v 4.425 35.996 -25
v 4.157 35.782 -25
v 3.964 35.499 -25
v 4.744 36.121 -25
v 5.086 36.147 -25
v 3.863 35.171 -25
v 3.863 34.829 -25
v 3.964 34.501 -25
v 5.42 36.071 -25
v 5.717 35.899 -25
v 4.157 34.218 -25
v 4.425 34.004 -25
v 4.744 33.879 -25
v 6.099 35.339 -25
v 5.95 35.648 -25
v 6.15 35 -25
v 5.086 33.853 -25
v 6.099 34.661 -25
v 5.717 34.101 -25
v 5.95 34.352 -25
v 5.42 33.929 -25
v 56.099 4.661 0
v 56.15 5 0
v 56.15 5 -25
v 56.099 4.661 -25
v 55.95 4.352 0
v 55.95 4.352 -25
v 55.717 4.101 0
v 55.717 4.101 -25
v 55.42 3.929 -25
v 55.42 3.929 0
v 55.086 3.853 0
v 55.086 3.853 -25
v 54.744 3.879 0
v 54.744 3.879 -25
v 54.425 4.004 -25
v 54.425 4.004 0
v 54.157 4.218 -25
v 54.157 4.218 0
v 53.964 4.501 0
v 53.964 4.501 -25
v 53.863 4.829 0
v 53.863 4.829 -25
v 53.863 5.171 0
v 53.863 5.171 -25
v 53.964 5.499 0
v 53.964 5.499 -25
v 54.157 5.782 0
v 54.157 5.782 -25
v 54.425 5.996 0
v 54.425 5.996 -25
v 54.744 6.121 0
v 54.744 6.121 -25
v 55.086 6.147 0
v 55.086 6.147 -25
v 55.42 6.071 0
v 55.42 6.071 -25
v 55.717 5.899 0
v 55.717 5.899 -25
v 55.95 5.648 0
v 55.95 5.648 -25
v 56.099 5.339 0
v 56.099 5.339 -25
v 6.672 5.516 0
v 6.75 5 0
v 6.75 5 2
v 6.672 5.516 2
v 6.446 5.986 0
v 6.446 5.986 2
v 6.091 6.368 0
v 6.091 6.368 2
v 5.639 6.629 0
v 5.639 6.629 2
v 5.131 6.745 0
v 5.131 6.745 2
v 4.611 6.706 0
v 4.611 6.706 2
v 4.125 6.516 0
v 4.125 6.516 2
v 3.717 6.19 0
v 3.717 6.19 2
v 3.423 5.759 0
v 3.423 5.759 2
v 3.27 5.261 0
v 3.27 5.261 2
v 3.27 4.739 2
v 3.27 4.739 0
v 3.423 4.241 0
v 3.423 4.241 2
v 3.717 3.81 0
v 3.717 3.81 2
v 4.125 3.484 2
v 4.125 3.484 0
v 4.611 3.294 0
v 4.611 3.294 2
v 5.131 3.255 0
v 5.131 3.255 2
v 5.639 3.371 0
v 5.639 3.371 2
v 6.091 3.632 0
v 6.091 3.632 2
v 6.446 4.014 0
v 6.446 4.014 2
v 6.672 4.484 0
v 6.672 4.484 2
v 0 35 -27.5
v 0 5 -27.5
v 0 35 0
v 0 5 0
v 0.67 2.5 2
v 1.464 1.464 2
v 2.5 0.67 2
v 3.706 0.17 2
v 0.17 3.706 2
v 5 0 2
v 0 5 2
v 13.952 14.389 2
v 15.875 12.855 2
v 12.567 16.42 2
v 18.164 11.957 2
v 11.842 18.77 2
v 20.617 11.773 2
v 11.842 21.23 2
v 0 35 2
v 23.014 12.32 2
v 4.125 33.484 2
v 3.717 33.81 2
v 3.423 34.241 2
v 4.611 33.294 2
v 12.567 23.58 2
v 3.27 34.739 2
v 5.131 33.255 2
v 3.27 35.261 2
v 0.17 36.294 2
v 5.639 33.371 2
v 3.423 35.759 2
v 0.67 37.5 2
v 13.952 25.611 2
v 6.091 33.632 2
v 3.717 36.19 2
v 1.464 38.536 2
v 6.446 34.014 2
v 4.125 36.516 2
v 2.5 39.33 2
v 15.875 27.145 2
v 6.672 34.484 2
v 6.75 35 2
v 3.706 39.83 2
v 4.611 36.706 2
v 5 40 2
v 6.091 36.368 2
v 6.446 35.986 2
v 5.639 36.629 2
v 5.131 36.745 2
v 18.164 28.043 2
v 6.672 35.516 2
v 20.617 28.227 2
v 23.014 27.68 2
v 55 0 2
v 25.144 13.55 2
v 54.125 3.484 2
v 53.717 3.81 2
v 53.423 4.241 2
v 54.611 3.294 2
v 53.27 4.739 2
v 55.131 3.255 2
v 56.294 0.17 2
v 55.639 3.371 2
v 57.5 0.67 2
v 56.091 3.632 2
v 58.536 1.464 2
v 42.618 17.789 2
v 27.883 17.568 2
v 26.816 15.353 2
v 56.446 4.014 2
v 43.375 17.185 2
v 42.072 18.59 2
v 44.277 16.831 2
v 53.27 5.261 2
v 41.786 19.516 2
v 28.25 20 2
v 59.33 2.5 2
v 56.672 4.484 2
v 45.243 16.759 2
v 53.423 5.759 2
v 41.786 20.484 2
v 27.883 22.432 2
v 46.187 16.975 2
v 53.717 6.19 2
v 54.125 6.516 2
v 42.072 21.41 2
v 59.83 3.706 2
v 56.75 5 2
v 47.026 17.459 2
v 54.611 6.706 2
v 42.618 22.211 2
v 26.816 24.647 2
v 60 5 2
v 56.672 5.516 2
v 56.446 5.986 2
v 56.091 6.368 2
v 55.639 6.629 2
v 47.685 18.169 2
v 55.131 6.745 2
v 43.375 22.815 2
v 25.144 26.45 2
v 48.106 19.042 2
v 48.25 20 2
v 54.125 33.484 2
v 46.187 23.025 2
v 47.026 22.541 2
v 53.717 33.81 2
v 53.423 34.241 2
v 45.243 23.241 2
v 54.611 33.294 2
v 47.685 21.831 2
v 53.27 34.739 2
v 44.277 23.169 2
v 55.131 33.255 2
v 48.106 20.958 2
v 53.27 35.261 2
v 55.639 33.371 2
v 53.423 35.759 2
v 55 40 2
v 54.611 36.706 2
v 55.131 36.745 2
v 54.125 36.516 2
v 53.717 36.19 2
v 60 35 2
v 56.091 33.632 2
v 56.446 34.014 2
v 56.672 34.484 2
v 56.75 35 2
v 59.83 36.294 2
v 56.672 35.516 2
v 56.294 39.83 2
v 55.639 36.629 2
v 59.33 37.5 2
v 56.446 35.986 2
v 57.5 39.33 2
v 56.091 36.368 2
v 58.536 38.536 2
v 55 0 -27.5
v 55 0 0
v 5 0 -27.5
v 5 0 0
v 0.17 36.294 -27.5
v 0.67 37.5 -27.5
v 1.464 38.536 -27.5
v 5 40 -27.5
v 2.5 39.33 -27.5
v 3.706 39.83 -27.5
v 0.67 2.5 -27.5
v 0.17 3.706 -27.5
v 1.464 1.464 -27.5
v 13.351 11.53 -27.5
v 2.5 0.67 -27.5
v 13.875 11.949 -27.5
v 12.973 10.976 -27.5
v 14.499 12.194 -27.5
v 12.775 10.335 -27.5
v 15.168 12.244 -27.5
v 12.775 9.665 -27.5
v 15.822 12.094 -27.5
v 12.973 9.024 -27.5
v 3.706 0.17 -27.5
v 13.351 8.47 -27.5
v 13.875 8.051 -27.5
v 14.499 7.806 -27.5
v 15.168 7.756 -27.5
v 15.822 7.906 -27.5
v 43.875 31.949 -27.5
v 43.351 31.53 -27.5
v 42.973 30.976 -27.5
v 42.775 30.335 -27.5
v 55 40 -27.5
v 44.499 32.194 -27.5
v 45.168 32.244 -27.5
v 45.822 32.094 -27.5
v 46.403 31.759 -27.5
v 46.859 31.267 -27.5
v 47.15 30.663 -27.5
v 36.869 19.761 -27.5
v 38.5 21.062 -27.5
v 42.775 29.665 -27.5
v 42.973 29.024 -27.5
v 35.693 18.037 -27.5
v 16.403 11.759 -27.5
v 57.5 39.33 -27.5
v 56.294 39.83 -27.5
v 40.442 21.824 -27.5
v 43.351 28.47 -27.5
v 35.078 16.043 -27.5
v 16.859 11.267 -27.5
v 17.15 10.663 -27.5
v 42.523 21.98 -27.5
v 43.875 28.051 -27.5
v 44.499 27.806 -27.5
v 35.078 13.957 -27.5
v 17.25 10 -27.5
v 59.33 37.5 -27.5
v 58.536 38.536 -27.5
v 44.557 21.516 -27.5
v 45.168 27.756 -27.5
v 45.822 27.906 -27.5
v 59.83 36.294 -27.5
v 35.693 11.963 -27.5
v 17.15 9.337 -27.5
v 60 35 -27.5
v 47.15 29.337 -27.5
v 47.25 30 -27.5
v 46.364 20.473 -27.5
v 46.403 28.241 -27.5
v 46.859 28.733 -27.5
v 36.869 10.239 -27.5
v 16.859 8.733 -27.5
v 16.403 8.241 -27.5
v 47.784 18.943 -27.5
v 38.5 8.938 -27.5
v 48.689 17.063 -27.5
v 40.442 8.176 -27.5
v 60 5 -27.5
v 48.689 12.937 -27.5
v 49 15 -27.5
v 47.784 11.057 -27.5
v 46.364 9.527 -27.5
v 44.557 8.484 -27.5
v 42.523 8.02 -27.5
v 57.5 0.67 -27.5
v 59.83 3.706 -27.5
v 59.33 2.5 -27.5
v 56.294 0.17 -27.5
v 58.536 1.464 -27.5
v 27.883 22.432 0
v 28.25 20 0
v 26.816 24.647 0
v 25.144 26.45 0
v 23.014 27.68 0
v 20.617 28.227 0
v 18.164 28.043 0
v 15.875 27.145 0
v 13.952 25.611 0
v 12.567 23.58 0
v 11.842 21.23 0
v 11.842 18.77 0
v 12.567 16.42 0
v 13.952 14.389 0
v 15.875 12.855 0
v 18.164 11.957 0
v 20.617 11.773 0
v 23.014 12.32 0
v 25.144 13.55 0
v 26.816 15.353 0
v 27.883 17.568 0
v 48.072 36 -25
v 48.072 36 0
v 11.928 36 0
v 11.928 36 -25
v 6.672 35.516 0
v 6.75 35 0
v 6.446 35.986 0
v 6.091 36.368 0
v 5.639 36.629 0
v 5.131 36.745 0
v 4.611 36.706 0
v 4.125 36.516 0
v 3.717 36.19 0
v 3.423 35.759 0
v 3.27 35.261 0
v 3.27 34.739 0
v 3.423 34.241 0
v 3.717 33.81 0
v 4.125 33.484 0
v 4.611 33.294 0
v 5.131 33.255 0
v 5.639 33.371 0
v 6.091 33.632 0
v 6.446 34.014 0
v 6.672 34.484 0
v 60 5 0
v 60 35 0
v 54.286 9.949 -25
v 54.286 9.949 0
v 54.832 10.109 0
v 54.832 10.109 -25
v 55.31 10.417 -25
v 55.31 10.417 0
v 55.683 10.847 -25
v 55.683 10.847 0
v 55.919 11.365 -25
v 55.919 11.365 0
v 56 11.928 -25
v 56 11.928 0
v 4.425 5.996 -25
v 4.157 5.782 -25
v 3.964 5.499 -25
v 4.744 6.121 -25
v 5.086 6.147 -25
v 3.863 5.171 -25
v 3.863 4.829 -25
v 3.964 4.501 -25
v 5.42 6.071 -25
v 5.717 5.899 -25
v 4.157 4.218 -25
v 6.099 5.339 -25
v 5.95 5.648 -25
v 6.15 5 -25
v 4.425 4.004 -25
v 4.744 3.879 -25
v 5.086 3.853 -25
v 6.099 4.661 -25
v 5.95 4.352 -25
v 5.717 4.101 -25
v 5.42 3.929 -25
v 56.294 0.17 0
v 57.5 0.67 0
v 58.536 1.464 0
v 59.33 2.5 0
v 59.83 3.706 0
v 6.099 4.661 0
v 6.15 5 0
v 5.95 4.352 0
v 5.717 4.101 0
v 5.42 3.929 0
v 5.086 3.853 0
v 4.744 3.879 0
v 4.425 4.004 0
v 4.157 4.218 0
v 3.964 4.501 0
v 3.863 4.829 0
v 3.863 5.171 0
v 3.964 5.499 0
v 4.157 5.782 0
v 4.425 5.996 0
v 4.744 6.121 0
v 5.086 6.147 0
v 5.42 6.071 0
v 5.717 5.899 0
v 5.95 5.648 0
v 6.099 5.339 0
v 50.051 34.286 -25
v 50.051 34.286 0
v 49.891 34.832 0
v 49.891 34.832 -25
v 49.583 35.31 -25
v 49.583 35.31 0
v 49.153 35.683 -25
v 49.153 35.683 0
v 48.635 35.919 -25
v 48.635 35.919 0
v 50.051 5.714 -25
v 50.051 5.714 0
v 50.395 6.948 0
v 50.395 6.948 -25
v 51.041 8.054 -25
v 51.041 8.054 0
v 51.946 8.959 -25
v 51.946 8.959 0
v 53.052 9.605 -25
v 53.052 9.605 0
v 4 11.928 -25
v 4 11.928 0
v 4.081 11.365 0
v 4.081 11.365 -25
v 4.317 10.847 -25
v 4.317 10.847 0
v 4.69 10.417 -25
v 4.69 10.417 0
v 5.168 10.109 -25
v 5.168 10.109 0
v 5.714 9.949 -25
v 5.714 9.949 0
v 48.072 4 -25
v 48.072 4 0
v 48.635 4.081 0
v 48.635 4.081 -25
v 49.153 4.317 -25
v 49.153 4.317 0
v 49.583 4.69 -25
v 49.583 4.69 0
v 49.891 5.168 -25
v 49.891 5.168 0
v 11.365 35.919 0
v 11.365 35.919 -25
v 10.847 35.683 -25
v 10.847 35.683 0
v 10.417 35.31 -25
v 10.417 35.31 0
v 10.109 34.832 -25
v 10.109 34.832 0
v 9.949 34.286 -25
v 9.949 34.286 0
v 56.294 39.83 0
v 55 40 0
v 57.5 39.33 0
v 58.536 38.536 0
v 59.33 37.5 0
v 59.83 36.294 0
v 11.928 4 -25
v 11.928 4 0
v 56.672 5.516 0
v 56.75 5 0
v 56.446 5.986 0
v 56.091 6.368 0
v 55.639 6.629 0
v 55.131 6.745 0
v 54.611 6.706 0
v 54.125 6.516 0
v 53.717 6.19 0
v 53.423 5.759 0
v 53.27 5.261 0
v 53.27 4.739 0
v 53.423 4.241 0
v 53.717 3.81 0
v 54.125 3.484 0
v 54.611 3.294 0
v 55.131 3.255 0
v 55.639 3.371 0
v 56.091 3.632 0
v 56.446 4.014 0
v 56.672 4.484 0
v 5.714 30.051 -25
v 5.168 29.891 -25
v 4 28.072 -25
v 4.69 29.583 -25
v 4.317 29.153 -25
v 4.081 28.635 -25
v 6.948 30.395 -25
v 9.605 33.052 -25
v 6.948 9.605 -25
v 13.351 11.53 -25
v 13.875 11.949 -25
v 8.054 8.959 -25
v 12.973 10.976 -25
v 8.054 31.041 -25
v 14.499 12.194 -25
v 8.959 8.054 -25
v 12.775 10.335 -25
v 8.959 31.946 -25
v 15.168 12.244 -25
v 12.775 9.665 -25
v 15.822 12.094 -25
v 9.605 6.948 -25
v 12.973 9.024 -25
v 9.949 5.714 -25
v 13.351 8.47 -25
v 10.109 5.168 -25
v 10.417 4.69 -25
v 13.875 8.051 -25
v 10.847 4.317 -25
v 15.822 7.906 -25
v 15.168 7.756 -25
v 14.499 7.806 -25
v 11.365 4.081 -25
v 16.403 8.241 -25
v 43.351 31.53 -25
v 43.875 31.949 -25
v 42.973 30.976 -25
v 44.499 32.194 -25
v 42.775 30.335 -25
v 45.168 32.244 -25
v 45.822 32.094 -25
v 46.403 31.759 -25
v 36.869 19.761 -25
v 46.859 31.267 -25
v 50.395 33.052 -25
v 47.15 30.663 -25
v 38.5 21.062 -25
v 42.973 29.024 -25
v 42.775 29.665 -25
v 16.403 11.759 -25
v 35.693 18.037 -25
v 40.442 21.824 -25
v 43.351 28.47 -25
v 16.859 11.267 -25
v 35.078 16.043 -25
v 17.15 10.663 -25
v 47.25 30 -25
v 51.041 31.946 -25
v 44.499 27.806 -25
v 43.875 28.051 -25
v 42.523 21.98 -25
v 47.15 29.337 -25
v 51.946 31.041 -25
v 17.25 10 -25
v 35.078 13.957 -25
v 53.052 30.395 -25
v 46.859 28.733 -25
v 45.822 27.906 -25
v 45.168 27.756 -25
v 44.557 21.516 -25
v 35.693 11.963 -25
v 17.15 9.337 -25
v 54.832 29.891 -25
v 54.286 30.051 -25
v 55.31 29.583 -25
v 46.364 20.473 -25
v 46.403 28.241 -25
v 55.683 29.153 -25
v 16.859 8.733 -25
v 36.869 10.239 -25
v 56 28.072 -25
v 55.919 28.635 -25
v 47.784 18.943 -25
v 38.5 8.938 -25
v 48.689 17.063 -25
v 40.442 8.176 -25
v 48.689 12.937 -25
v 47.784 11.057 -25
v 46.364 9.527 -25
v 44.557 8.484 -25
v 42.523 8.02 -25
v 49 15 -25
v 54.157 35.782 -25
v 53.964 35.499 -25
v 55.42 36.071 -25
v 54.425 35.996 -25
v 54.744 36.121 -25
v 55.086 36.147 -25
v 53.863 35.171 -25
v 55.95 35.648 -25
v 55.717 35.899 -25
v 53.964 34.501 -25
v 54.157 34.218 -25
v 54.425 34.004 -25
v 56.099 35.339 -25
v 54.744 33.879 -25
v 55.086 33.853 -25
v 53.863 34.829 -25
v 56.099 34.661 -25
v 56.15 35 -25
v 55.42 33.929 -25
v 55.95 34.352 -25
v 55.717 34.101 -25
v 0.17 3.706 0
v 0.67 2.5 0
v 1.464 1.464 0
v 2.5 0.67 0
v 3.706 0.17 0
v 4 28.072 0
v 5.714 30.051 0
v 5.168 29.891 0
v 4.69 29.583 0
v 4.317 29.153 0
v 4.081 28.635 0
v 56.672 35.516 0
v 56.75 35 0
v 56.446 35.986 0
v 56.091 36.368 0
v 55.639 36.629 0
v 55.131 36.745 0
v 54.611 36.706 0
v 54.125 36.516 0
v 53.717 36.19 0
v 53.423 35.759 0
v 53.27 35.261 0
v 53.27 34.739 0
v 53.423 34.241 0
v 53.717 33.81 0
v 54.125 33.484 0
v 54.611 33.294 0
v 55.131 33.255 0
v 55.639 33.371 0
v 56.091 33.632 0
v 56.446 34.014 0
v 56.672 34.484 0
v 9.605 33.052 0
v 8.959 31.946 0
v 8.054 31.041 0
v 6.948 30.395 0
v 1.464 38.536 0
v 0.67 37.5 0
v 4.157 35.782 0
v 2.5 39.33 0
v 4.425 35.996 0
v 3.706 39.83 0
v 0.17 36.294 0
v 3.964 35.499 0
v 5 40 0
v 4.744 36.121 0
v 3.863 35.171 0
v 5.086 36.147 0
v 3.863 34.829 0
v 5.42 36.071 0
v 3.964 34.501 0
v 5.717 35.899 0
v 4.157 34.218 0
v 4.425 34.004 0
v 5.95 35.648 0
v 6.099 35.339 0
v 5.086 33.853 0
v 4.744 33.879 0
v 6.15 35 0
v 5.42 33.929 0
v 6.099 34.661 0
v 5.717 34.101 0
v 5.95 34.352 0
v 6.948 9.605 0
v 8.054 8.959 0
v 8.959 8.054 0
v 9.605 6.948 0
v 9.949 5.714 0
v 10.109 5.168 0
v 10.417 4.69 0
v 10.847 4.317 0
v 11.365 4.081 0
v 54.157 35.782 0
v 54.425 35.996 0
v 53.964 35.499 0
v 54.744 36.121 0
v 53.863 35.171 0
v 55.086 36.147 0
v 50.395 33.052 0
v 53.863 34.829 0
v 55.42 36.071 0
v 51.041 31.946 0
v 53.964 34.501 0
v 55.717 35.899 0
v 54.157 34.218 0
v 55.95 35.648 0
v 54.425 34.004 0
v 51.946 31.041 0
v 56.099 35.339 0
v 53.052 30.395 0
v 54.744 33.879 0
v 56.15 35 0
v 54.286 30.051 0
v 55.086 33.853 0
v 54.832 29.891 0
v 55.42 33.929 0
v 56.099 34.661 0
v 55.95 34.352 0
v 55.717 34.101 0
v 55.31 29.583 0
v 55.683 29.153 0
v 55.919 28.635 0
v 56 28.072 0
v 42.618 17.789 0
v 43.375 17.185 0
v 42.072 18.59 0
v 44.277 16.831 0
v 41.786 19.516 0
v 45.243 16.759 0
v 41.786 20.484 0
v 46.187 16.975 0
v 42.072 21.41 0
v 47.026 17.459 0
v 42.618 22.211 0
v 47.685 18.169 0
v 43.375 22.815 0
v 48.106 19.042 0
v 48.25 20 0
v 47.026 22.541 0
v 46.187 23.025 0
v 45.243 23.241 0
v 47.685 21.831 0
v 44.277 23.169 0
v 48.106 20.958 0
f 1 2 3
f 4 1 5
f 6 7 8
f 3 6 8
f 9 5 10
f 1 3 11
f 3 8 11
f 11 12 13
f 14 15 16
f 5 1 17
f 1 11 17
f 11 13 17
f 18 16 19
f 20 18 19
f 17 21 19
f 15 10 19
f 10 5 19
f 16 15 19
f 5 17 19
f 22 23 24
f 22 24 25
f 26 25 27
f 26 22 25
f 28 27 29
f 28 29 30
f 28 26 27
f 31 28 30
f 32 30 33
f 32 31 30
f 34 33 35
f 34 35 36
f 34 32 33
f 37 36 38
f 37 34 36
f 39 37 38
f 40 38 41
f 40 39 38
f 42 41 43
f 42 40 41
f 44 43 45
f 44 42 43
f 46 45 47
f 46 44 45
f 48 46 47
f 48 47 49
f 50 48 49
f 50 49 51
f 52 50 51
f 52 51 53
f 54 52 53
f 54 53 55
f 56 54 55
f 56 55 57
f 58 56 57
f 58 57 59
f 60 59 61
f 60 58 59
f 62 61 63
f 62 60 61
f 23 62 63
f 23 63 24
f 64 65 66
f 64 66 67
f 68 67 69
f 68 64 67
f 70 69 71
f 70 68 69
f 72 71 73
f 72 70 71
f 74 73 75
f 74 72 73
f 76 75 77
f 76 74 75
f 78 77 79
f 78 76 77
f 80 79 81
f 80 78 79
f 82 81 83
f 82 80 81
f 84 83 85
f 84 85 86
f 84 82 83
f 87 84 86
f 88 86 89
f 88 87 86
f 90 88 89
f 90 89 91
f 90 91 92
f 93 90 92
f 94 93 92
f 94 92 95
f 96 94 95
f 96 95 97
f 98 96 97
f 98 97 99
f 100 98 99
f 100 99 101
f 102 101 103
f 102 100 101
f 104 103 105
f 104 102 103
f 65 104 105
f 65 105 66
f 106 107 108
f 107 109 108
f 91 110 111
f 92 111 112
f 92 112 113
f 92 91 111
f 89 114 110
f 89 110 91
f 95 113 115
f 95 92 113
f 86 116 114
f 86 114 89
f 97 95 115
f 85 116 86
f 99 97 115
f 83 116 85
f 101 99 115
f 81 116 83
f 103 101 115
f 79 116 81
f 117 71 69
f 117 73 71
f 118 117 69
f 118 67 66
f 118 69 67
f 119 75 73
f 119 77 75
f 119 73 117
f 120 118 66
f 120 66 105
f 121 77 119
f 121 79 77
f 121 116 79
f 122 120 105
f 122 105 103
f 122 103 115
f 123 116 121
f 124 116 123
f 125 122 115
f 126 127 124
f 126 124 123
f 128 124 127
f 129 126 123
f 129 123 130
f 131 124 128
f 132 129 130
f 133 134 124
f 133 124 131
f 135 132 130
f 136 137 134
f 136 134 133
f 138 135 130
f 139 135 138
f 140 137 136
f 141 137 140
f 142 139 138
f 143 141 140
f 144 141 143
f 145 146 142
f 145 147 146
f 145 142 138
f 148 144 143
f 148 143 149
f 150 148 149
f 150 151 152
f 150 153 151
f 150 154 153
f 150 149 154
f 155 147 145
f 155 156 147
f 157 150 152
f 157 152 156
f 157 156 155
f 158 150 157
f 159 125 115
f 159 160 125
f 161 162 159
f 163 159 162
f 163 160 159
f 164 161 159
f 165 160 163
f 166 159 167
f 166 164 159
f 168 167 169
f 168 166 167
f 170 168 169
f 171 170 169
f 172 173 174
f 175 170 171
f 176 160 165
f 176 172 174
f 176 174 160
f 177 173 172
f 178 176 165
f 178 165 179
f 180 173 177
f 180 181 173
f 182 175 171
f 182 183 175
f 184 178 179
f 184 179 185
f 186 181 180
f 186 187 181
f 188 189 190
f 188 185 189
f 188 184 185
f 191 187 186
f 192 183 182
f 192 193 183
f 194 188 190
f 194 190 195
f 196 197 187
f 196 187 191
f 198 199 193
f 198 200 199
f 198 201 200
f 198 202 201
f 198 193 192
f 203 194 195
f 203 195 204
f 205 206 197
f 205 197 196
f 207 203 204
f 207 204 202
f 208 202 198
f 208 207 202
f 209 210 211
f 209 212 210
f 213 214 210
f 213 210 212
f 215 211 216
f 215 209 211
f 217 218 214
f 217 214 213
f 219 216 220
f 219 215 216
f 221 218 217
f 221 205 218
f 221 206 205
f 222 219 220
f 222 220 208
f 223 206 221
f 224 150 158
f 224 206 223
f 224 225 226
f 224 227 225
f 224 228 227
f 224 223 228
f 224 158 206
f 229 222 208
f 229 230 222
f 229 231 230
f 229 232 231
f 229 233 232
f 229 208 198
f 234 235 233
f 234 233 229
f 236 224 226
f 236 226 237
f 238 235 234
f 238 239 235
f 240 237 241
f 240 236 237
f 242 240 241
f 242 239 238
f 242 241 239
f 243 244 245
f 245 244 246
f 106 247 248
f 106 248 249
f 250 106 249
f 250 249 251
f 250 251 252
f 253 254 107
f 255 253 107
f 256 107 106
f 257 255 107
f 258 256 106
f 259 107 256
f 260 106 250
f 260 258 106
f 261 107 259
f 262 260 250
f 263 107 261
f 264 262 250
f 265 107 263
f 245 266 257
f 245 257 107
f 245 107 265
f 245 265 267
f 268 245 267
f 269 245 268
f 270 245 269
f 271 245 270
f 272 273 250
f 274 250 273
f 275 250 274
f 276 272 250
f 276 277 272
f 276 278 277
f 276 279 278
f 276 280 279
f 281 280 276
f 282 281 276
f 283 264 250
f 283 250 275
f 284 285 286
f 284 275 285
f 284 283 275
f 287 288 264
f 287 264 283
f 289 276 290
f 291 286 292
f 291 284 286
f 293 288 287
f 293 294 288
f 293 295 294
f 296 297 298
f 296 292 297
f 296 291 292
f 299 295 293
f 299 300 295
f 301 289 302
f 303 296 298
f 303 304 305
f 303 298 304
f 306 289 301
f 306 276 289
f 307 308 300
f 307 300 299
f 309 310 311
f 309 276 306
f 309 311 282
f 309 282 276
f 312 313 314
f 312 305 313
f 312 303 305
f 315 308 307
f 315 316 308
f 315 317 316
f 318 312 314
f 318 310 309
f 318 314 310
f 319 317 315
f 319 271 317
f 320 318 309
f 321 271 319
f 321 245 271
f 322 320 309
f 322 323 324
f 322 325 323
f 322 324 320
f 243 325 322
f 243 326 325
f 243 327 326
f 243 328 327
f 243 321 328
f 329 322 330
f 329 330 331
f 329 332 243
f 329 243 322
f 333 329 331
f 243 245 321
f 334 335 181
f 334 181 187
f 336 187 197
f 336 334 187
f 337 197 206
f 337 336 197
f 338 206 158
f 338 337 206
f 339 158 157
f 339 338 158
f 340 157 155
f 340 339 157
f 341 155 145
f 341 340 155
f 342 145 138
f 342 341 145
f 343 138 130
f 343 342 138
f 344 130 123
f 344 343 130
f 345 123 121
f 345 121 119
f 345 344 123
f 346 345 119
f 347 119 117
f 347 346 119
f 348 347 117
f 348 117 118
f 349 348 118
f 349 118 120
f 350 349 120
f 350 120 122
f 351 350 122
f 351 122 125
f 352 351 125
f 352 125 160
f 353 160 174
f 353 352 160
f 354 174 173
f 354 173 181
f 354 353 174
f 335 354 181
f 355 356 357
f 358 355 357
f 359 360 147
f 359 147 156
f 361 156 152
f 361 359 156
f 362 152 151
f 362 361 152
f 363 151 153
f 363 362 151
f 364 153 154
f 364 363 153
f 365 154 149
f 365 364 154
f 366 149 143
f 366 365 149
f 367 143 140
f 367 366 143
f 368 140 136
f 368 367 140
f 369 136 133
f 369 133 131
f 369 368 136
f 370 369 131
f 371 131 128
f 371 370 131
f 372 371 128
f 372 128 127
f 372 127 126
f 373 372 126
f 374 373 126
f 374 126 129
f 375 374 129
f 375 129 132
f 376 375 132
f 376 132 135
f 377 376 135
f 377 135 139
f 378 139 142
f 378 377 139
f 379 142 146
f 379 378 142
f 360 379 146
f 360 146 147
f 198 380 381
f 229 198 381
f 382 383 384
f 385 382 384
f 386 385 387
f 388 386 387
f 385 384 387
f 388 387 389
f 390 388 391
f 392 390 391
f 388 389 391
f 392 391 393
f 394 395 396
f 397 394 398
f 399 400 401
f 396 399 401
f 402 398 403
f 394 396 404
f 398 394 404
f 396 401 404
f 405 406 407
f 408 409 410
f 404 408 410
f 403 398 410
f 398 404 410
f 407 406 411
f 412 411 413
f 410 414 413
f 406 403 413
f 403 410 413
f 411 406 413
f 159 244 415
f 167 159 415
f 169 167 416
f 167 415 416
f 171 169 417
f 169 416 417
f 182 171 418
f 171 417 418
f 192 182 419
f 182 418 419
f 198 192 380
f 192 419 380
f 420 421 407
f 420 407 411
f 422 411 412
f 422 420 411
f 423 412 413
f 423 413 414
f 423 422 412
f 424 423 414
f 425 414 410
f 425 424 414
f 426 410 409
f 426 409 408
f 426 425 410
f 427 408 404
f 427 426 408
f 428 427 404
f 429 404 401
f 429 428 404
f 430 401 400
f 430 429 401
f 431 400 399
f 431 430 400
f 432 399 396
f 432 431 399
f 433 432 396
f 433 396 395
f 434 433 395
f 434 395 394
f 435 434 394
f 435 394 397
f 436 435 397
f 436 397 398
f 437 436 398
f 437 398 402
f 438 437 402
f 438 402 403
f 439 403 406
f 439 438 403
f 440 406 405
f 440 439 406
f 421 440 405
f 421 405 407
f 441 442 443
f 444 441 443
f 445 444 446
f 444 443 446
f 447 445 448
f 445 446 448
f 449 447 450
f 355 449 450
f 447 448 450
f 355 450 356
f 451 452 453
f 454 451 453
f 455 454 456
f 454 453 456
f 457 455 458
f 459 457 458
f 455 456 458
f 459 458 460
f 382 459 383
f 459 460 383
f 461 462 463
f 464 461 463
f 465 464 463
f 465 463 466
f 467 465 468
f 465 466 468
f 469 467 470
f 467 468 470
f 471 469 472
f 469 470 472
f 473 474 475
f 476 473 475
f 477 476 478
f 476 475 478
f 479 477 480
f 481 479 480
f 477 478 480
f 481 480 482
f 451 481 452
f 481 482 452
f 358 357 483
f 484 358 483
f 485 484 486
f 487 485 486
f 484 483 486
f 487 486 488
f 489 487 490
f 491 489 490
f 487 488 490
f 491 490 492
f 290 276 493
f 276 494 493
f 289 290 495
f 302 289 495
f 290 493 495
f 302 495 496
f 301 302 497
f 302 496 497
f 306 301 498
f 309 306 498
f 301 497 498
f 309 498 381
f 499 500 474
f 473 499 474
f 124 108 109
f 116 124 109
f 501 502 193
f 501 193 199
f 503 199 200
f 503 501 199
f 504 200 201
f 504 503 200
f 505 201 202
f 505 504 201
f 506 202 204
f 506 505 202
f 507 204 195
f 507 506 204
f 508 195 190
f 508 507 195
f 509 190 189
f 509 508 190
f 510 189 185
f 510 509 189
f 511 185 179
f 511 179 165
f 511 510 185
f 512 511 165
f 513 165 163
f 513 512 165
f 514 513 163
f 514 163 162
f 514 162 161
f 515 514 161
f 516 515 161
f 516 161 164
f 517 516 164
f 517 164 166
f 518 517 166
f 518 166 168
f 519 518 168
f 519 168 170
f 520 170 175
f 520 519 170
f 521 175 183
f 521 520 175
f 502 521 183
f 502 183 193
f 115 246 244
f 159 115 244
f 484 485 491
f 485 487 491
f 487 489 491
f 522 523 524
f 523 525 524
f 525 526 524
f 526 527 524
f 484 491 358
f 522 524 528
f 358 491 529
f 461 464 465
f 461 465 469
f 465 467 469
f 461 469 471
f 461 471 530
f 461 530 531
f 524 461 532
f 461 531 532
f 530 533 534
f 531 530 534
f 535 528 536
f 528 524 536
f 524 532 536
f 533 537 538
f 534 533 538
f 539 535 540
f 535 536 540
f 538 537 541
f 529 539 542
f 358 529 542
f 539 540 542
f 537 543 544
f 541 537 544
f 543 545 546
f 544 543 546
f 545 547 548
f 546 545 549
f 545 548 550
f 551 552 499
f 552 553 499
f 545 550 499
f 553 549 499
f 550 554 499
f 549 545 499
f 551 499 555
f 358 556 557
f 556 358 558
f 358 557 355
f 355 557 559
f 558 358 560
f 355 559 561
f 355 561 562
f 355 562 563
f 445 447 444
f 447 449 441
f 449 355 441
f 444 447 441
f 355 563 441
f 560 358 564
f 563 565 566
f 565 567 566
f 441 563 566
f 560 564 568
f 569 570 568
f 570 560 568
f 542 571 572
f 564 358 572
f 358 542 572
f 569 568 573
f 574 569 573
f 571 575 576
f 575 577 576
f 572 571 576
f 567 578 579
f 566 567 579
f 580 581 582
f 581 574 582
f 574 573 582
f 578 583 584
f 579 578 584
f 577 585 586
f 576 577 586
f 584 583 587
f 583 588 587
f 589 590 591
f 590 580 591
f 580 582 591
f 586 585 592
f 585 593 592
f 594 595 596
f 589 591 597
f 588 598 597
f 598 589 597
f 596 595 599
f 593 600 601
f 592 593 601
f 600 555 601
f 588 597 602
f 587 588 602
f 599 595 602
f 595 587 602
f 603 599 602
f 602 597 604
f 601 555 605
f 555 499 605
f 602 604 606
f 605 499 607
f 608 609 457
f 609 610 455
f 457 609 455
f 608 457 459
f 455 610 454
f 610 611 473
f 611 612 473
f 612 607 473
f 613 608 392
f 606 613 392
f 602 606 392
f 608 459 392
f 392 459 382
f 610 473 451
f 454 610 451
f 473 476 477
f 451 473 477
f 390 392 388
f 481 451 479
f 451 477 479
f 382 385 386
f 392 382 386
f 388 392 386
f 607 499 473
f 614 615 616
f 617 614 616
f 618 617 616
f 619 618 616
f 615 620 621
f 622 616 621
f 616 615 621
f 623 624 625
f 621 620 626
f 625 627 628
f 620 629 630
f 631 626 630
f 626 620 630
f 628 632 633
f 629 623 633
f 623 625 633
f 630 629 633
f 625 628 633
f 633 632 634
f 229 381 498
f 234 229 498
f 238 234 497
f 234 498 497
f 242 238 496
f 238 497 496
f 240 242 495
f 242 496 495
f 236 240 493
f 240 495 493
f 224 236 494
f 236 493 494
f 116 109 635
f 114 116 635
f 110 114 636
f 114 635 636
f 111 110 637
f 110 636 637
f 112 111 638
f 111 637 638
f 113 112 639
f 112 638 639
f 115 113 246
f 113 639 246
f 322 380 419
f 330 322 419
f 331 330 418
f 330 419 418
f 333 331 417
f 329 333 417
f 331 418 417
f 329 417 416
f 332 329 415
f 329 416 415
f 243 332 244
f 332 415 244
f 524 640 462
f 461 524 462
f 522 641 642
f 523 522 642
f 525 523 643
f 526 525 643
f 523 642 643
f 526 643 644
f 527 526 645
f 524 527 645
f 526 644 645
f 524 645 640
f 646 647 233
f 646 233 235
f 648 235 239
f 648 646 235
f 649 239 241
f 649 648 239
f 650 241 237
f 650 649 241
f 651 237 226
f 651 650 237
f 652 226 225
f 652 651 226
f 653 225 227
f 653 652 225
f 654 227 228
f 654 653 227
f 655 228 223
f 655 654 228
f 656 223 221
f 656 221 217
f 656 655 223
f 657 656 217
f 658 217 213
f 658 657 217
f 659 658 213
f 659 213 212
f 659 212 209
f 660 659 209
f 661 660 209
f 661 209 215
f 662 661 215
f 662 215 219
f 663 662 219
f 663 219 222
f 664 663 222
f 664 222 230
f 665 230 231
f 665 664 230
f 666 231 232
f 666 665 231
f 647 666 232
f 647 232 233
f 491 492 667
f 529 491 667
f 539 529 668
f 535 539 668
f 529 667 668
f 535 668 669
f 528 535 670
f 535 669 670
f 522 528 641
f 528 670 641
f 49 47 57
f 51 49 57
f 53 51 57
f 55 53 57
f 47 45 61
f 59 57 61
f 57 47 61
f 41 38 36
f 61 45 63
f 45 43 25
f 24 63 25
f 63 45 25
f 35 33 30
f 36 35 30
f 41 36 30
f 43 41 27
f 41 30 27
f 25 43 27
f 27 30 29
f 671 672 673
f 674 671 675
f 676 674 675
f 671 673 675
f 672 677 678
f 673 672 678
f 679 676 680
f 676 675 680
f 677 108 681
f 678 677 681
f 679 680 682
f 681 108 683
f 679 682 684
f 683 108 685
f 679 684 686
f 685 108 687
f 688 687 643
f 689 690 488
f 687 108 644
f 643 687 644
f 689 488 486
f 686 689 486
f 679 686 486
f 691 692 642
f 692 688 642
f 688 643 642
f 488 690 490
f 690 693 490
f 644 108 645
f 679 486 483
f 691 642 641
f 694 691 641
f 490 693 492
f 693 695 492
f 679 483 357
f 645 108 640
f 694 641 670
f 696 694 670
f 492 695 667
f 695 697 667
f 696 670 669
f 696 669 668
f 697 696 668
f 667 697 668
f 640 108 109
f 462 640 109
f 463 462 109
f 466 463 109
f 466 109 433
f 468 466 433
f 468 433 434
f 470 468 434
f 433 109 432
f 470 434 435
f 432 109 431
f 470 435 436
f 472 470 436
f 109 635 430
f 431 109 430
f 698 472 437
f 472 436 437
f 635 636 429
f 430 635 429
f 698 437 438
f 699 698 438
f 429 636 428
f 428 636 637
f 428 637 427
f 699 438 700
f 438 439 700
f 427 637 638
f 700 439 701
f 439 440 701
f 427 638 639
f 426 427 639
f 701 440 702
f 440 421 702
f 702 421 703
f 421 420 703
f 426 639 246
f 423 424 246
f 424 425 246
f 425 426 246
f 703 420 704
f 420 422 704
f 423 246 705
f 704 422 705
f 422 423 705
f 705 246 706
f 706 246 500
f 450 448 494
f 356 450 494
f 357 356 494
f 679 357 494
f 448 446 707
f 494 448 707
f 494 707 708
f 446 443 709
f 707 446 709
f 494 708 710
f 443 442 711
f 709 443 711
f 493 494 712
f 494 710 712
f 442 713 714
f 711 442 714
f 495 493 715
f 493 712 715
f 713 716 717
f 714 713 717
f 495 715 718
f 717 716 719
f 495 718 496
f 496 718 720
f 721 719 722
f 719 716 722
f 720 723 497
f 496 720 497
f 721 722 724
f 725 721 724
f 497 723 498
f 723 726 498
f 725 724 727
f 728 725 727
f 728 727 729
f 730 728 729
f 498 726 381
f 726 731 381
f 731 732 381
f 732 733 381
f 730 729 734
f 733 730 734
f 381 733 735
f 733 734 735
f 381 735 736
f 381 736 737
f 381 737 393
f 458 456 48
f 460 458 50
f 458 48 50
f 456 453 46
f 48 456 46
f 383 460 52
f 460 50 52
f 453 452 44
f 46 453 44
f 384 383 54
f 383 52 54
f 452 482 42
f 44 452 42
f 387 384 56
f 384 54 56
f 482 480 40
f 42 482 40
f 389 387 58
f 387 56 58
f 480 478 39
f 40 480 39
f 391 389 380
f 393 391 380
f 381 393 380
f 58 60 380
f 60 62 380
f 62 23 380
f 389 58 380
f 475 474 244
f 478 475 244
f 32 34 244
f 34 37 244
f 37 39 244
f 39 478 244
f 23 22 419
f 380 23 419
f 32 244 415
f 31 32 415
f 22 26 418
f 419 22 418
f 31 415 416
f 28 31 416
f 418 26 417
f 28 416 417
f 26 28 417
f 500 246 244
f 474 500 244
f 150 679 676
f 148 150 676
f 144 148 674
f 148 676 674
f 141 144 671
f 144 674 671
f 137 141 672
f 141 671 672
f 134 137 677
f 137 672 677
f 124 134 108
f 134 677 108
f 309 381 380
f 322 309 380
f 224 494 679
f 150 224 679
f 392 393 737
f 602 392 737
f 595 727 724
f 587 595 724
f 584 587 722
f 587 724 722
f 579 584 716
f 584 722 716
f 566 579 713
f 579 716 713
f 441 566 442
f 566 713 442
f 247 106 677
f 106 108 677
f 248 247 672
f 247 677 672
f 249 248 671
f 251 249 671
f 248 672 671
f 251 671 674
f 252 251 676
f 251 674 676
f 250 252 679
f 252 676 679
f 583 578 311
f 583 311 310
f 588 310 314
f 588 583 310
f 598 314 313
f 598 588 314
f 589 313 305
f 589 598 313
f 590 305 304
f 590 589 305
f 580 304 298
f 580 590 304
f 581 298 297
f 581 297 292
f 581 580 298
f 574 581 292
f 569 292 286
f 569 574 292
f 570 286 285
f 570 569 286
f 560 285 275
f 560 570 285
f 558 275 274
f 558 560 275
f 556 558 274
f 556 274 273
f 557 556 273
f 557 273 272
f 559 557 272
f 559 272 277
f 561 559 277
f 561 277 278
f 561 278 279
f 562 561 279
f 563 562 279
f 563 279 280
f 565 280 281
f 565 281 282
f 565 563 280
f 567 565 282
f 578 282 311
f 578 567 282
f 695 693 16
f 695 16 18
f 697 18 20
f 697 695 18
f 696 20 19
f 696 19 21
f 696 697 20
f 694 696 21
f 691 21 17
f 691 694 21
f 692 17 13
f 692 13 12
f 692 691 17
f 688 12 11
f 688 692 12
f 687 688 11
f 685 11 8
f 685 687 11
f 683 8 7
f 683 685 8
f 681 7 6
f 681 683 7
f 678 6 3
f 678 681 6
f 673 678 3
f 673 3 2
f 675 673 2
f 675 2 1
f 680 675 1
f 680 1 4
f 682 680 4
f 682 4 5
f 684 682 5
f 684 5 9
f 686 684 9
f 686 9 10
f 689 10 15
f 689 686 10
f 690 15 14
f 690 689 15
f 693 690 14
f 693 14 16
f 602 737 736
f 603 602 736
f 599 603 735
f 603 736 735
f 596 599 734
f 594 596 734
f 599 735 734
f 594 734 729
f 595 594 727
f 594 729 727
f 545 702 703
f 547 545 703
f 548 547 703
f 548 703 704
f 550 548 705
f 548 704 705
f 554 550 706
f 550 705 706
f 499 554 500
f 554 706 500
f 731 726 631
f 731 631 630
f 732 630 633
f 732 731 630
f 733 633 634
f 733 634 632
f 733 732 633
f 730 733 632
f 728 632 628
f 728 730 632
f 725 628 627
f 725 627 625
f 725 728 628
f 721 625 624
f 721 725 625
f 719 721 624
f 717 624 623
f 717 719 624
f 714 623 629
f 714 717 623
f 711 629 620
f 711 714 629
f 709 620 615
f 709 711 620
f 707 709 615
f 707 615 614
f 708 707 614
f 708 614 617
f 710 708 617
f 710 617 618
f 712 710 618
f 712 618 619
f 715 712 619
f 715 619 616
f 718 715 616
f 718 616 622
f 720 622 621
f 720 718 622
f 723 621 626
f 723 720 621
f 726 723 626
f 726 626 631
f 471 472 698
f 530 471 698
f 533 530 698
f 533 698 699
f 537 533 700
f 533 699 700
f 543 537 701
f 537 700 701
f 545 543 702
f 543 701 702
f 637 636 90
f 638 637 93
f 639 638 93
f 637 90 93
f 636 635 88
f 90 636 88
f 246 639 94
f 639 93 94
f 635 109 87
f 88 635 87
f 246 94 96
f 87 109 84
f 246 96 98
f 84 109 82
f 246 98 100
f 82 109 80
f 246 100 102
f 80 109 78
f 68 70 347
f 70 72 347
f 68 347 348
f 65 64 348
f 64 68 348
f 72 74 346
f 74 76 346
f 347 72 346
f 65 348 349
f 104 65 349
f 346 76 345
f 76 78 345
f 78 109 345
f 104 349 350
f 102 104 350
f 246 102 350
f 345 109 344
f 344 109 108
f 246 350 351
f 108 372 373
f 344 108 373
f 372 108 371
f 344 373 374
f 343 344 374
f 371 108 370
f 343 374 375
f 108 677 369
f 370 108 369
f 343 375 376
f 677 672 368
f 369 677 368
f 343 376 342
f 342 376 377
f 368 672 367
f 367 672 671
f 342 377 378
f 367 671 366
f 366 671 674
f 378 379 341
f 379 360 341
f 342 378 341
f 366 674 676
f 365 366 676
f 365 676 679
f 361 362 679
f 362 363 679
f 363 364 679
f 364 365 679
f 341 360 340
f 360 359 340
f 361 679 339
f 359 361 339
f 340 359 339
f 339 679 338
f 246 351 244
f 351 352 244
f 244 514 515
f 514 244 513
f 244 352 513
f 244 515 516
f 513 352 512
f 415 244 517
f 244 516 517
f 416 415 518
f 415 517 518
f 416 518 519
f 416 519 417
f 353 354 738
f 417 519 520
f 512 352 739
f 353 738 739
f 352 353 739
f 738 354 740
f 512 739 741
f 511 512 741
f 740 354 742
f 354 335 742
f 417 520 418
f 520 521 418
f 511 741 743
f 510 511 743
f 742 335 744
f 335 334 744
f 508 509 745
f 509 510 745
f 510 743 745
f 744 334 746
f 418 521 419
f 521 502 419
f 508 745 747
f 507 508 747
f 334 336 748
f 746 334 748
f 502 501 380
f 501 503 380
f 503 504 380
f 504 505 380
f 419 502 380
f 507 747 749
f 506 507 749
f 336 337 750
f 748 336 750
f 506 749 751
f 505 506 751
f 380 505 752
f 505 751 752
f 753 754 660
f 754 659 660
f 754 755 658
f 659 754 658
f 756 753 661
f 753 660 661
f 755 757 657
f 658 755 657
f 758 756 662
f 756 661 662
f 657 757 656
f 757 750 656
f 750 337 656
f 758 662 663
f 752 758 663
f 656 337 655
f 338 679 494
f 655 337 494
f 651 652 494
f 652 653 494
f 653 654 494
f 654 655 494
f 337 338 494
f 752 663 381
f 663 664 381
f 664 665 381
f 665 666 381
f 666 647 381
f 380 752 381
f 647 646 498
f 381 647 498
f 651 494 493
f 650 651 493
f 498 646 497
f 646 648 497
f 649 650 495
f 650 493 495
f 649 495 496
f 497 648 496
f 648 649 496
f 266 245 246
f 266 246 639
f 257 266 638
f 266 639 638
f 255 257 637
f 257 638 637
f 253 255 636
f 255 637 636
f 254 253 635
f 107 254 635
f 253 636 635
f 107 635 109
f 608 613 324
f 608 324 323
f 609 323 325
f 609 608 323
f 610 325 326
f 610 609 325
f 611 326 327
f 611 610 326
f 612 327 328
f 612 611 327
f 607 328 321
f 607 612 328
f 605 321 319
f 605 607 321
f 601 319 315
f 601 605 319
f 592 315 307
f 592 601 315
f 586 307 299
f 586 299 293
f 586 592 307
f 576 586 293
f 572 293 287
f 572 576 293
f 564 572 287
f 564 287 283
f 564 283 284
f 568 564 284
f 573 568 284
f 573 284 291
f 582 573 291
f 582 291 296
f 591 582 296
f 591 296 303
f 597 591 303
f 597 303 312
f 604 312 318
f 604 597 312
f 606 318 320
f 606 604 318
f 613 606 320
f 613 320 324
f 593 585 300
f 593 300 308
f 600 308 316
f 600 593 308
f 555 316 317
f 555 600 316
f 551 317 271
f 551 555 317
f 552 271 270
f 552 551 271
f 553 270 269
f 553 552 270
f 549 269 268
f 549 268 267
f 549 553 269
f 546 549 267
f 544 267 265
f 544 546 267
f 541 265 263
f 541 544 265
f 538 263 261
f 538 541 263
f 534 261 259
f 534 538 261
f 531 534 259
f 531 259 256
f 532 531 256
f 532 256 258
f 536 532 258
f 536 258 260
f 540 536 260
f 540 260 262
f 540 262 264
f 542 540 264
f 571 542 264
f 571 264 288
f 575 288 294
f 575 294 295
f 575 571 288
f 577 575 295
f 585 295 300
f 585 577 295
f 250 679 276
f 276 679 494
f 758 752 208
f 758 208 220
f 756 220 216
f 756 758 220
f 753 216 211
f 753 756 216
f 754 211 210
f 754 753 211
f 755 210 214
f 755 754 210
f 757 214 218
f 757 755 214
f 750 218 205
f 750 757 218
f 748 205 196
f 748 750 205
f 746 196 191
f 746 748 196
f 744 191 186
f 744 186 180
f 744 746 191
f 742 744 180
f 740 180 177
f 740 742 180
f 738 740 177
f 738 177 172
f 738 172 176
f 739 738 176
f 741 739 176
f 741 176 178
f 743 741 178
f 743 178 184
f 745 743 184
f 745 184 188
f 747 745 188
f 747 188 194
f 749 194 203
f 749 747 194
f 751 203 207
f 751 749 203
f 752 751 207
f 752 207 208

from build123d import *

# Parameters (mm, degrees)
F0_R     = 1.75
F0_R_2   = 8.25
F0_R_3   = 3.25
F1_DEPTH = 2
F2_R     = 1.15
F3_DEPTH = 25
F4_R     = 2.25
F4_R_2   = 7
F5_DEPTH = 2.5


with BuildPart() as f1:
    # F0 (on Top) → F1 (new body)
    with BuildSketch(Plane.XY):
        with BuildLine():
            ThreePointArc((0, 5), (1.464466, 1.464466), (5, 0))
            Line((5, 0), (55, 0))
            ThreePointArc((55, 0), (58.535534, 1.464466), (60, 5))
            Line((60, 5), (60, 35))
            ThreePointArc((60, 35), (58.535534, 38.535534), (55, 40))
            Line((55, 40), (5, 40))
            ThreePointArc((5, 40), (1.464466, 38.535534), (0, 35))
            Line((0, 35), (0, 5))
        make_face()
        with Locations((5, 5)):
            Circle(F0_R, mode=Mode.SUBTRACT)
        with Locations((55, 5)):
            Circle(F0_R, mode=Mode.SUBTRACT)
        with Locations((20, 20)):
            Circle(F0_R_2, mode=Mode.SUBTRACT)
        with Locations((5, 35)):
            Circle(F0_R, mode=Mode.SUBTRACT)
        with Locations((45, 20)):
            Circle(F0_R_3, mode=Mode.SUBTRACT)
        with Locations((55, 35)):
            Circle(F0_R, mode=Mode.SUBTRACT)
    extrude(amount=F1_DEPTH)


with BuildPart() as f3:
    # F2 (on face) → F3 (new body)
    with BuildSketch(Plane(origin=(0, 0, 0), x_dir=(1, 0, 0), z_dir=(0, 0, -1))):
        with BuildLine():
            Line((55, 0), (5, 0))
            ThreePointArc((5, 0), (1.464466, -1.464466), (0, -5))
            Line((0, -5), (0, -35))
            ThreePointArc((0, -35), (1.464466, -38.535534), (5, -40))
            Line((5, -40), (55, -40))
            ThreePointArc((55, -40), (58.535534, -38.535534), (60, -35))
            Line((60, -35), (60, -5))
            ThreePointArc((60, -5), (58.535534, -1.464466), (55, 0))
        make_face()
        with Locations((5, -35)):
            Circle(F2_R, mode=Mode.SUBTRACT)
        with Locations((55, -35)):
            Circle(F2_R, mode=Mode.SUBTRACT)
        with Locations((5, -5)):
            Circle(F2_R, mode=Mode.SUBTRACT)
        with BuildLine():
            ThreePointArc((4, -11.928203), (4.488142, -10.618896), (5.714286, -9.948717))
            ThreePointArc((5.714286, -9.948717), (8.535534, -8.535534), (9.948717, -5.714286))
            ThreePointArc((9.948717, -5.714286), (10.618896, -4.488142), (11.928203, -4))
            Line((11.928203, -4), (48.071797, -4))
            ThreePointArc((48.071797, -4), (49.381104, -4.488142), (50.051283, -5.714286))
            ThreePointArc((50.051283, -5.714286), (51.464466, -8.535534), (54.285714, -9.948717))
            ThreePointArc((54.285714, -9.948717), (55.511858, -10.618896), (56, -11.928203))
            Line((56, -11.928203), (56, -28.071797))
            ThreePointArc((56, -28.071797), (55.511858, -29.381104), (54.285714, -30.051283))
            ThreePointArc((54.285714, -30.051283), (51.464466, -31.464466), (50.051283, -34.285714))
            ThreePointArc((50.051283, -34.285714), (49.381104, -35.511858), (48.071797, -36))
            Line((48.071797, -36), (11.928203, -36))
            ThreePointArc((11.928203, -36), (10.618896, -35.511858), (9.948717, -34.285714))
            ThreePointArc((9.948717, -34.285714), (8.535534, -31.464466), (5.714286, -30.051283))
            ThreePointArc((5.714286, -30.051283), (4.488142, -29.381104), (4, -28.071797))
            Line((4, -28.071797), (4, -11.928203))
        make_face(mode=Mode.SUBTRACT)
        with Locations((55, -5)):
            Circle(F2_R, mode=Mode.SUBTRACT)
    extrude(amount=F3_DEPTH)

    # F4 (on face) → F5 (join)
    with BuildSketch(Plane(origin=(0, 0, -25), x_dir=(1, 0, 0), z_dir=(0, 0, -1))):
        with BuildLine():
            Line((30, 0), (5, 0))
            ThreePointArc((5, 0), (1.464466, -1.464466), (0, -5))
            Line((0, -5), (0, -35))
            ThreePointArc((0, -35), (1.464466, -38.535534), (5, -40))
            Line((5, -40), (30, -40))
            Line((30, -40), (30, 0))
        make_face()
        with Locations((15, -10)):
            Circle(F4_R, mode=Mode.SUBTRACT)
        with BuildLine():
            Line((55, 0), (30, 0))
            Line((30, 0), (30, -40))
            Line((30, -40), (55, -40))
            ThreePointArc((55, -40), (58.535534, -38.535534), (60, -35))
            Line((60, -35), (60, -5))
            ThreePointArc((60, -5), (58.535534, -1.464466), (55, 0))
        make_face()
        with Locations((45, -30)):
            Circle(F4_R, mode=Mode.SUBTRACT)
        with Locations((42, -15)):
            Circle(F4_R_2, mode=Mode.SUBTRACT)
    extrude(amount=F5_DEPTH)


solid = Compound([f1.part, f3.part])
